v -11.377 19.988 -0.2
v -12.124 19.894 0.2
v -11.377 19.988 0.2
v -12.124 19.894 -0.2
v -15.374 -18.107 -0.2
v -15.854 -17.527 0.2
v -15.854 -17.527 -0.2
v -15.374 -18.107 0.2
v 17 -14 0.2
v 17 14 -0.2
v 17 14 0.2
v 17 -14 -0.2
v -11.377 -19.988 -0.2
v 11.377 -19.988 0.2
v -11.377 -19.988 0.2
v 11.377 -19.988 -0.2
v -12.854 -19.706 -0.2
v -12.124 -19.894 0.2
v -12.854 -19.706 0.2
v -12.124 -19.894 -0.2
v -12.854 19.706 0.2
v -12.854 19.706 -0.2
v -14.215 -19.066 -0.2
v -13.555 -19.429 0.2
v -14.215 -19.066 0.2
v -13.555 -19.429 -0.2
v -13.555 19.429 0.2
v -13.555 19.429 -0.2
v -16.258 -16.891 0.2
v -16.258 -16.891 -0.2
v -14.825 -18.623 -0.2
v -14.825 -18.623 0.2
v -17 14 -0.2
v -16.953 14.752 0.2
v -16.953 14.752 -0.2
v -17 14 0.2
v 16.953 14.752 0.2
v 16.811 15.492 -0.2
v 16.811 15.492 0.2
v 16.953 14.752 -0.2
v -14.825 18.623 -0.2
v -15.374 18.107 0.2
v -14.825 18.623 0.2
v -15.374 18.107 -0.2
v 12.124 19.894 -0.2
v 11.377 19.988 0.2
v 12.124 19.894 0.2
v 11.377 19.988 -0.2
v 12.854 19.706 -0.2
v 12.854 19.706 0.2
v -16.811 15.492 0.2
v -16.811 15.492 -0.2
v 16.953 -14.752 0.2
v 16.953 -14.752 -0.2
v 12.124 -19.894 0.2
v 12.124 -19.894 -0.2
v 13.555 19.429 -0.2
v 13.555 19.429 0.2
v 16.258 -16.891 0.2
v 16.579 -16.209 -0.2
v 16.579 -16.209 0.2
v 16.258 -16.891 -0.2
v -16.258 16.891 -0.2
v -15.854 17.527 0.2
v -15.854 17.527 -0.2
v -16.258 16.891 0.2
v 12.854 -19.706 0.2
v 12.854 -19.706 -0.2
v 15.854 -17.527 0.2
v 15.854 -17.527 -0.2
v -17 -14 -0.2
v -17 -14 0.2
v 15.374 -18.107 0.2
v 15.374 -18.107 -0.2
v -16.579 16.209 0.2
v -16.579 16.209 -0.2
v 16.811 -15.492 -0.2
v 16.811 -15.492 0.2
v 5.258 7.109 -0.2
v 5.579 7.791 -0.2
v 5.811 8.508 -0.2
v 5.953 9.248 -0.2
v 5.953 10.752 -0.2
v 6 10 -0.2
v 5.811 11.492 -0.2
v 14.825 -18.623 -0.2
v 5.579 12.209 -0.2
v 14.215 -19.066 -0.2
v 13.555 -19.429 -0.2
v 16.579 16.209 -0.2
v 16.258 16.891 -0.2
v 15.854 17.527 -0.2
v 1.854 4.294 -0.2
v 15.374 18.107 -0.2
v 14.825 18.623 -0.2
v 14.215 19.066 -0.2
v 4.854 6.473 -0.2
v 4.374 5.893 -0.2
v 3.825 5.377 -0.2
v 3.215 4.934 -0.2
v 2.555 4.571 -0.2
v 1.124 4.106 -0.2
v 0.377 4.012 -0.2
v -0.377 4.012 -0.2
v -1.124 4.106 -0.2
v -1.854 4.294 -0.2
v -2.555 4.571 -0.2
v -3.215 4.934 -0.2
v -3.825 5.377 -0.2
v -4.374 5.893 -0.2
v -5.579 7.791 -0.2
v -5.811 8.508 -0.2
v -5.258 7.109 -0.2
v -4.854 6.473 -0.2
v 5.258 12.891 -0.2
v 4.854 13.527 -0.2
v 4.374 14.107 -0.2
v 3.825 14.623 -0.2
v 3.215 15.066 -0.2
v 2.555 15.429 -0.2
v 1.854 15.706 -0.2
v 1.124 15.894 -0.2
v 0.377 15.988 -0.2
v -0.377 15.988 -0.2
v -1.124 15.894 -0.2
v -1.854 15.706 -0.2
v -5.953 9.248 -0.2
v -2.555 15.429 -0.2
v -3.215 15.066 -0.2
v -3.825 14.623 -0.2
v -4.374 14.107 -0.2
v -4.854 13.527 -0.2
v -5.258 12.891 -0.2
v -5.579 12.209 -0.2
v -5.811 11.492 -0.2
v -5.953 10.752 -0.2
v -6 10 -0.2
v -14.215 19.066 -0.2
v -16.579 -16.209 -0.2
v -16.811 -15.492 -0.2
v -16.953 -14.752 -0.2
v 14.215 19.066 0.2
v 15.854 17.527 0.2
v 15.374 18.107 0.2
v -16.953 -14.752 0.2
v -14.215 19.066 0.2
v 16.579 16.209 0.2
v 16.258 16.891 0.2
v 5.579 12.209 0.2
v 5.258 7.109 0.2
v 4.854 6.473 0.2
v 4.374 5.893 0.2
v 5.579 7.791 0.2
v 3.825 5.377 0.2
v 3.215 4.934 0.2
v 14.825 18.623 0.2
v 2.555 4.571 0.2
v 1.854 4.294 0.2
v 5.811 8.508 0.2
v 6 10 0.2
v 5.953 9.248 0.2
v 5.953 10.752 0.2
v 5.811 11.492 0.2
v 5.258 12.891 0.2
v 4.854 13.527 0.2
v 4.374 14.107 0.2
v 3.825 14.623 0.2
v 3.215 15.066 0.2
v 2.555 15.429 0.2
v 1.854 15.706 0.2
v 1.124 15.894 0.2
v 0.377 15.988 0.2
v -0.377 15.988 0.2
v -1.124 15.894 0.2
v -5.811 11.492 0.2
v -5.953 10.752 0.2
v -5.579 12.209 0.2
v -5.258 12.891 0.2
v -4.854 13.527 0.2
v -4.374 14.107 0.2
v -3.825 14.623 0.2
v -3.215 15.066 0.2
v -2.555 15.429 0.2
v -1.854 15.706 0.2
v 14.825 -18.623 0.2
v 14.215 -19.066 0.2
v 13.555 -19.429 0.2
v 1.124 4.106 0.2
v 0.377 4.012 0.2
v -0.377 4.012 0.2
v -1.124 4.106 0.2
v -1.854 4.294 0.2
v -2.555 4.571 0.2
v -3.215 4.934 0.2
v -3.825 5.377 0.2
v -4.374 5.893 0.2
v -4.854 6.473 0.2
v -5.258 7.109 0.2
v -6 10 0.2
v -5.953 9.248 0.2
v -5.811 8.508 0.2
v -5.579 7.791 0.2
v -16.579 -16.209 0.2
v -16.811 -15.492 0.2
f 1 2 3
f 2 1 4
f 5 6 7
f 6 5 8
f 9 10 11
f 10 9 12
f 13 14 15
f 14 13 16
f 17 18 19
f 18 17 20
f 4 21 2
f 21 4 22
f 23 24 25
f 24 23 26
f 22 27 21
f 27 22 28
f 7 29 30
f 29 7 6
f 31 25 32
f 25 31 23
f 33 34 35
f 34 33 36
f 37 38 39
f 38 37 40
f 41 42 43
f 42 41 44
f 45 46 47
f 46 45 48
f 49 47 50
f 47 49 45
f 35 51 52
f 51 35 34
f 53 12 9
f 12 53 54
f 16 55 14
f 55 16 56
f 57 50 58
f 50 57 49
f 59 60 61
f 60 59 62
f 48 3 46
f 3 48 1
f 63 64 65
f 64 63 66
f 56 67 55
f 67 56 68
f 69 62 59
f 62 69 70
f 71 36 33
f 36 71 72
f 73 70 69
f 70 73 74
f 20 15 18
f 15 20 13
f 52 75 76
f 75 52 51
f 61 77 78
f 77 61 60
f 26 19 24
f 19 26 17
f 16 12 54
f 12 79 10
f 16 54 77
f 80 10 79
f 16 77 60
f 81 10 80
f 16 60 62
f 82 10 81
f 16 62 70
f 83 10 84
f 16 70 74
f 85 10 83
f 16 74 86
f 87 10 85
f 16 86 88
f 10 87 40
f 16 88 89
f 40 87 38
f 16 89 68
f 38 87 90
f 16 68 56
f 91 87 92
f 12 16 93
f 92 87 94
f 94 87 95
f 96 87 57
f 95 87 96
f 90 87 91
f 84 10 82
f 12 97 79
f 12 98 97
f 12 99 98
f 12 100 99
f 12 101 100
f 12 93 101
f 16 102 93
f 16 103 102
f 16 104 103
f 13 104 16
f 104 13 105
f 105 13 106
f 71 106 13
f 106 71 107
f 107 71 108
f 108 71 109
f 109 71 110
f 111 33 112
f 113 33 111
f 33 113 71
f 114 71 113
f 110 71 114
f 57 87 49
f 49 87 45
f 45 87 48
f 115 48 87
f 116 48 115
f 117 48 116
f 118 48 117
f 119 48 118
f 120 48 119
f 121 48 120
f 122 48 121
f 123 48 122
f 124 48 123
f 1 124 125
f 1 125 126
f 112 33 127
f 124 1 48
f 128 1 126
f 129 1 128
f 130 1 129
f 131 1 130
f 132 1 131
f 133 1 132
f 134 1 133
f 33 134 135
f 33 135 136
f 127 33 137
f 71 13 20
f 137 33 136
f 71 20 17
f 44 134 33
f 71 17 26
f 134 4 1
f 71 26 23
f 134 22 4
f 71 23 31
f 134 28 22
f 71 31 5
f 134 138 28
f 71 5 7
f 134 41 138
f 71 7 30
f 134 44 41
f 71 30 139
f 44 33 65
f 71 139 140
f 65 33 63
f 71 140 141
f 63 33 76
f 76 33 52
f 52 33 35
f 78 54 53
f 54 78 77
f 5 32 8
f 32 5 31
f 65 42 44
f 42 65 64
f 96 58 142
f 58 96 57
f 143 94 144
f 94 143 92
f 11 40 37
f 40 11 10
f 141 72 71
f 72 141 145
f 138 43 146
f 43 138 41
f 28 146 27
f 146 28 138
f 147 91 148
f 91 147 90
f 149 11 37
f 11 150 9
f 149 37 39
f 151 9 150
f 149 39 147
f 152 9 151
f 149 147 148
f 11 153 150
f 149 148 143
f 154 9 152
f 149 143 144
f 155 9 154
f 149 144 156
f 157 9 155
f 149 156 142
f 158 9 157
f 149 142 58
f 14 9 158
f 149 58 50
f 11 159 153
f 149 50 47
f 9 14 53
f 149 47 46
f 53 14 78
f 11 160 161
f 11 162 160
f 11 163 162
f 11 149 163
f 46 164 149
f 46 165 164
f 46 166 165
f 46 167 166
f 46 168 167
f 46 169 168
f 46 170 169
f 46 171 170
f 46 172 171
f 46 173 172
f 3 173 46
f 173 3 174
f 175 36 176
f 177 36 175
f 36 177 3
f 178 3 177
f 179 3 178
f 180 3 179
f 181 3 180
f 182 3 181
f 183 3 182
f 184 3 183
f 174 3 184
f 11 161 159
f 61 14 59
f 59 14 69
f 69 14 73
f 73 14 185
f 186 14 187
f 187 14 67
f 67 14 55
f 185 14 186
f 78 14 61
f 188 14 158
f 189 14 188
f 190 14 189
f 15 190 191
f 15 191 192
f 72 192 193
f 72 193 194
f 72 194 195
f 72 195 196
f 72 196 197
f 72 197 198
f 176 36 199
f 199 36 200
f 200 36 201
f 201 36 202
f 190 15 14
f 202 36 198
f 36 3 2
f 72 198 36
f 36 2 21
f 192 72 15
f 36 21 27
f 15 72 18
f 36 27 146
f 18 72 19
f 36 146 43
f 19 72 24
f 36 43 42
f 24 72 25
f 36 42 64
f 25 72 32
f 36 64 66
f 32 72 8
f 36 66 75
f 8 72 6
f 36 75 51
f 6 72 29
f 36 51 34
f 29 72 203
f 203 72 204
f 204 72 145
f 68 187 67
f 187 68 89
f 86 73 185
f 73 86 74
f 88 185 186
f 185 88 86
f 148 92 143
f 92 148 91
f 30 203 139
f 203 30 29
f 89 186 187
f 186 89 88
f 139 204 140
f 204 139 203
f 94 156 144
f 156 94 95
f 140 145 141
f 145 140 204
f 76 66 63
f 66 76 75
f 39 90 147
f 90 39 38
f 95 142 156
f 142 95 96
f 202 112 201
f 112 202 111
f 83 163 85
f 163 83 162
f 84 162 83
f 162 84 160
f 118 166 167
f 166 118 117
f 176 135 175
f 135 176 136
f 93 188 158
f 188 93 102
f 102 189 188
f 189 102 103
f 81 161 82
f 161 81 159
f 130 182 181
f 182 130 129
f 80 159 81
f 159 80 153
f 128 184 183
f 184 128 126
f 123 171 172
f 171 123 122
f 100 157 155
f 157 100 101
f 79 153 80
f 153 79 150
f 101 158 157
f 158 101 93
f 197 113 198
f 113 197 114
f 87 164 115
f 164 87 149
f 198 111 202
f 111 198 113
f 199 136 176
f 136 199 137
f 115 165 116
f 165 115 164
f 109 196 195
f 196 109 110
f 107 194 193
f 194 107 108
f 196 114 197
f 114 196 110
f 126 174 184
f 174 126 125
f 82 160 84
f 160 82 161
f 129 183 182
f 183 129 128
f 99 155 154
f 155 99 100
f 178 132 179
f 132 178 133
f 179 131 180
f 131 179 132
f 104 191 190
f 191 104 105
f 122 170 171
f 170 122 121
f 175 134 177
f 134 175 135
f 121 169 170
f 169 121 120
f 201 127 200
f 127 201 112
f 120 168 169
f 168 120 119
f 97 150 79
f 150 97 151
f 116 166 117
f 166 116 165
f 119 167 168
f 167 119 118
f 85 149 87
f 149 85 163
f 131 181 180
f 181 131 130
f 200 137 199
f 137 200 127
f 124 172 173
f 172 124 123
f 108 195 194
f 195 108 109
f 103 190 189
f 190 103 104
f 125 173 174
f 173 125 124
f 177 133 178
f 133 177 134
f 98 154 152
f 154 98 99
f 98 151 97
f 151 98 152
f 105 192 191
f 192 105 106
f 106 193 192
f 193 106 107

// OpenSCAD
//Hang tab dimensions
tab_height = 40;
tab_width = 34;
tab_thickness = 0.4;

hole_diameter = 12;
hole_offset = 10;

rounding_radius = 6;

// number of fragments (how round)
$fn=50;

height = tab_height - 2*rounding_radius;
width = tab_width - 2*rounding_radius;
difference(){
    minkowski(){
        cube([width, height, tab_thickness/2],center = true);
        cylinder(r=rounding_radius, tab_thickness/2,center=true);
    }
    translate([0,hole_offset,0]) cylinder(d=hole_diameter,h=tab_thickness,center = true);
}
